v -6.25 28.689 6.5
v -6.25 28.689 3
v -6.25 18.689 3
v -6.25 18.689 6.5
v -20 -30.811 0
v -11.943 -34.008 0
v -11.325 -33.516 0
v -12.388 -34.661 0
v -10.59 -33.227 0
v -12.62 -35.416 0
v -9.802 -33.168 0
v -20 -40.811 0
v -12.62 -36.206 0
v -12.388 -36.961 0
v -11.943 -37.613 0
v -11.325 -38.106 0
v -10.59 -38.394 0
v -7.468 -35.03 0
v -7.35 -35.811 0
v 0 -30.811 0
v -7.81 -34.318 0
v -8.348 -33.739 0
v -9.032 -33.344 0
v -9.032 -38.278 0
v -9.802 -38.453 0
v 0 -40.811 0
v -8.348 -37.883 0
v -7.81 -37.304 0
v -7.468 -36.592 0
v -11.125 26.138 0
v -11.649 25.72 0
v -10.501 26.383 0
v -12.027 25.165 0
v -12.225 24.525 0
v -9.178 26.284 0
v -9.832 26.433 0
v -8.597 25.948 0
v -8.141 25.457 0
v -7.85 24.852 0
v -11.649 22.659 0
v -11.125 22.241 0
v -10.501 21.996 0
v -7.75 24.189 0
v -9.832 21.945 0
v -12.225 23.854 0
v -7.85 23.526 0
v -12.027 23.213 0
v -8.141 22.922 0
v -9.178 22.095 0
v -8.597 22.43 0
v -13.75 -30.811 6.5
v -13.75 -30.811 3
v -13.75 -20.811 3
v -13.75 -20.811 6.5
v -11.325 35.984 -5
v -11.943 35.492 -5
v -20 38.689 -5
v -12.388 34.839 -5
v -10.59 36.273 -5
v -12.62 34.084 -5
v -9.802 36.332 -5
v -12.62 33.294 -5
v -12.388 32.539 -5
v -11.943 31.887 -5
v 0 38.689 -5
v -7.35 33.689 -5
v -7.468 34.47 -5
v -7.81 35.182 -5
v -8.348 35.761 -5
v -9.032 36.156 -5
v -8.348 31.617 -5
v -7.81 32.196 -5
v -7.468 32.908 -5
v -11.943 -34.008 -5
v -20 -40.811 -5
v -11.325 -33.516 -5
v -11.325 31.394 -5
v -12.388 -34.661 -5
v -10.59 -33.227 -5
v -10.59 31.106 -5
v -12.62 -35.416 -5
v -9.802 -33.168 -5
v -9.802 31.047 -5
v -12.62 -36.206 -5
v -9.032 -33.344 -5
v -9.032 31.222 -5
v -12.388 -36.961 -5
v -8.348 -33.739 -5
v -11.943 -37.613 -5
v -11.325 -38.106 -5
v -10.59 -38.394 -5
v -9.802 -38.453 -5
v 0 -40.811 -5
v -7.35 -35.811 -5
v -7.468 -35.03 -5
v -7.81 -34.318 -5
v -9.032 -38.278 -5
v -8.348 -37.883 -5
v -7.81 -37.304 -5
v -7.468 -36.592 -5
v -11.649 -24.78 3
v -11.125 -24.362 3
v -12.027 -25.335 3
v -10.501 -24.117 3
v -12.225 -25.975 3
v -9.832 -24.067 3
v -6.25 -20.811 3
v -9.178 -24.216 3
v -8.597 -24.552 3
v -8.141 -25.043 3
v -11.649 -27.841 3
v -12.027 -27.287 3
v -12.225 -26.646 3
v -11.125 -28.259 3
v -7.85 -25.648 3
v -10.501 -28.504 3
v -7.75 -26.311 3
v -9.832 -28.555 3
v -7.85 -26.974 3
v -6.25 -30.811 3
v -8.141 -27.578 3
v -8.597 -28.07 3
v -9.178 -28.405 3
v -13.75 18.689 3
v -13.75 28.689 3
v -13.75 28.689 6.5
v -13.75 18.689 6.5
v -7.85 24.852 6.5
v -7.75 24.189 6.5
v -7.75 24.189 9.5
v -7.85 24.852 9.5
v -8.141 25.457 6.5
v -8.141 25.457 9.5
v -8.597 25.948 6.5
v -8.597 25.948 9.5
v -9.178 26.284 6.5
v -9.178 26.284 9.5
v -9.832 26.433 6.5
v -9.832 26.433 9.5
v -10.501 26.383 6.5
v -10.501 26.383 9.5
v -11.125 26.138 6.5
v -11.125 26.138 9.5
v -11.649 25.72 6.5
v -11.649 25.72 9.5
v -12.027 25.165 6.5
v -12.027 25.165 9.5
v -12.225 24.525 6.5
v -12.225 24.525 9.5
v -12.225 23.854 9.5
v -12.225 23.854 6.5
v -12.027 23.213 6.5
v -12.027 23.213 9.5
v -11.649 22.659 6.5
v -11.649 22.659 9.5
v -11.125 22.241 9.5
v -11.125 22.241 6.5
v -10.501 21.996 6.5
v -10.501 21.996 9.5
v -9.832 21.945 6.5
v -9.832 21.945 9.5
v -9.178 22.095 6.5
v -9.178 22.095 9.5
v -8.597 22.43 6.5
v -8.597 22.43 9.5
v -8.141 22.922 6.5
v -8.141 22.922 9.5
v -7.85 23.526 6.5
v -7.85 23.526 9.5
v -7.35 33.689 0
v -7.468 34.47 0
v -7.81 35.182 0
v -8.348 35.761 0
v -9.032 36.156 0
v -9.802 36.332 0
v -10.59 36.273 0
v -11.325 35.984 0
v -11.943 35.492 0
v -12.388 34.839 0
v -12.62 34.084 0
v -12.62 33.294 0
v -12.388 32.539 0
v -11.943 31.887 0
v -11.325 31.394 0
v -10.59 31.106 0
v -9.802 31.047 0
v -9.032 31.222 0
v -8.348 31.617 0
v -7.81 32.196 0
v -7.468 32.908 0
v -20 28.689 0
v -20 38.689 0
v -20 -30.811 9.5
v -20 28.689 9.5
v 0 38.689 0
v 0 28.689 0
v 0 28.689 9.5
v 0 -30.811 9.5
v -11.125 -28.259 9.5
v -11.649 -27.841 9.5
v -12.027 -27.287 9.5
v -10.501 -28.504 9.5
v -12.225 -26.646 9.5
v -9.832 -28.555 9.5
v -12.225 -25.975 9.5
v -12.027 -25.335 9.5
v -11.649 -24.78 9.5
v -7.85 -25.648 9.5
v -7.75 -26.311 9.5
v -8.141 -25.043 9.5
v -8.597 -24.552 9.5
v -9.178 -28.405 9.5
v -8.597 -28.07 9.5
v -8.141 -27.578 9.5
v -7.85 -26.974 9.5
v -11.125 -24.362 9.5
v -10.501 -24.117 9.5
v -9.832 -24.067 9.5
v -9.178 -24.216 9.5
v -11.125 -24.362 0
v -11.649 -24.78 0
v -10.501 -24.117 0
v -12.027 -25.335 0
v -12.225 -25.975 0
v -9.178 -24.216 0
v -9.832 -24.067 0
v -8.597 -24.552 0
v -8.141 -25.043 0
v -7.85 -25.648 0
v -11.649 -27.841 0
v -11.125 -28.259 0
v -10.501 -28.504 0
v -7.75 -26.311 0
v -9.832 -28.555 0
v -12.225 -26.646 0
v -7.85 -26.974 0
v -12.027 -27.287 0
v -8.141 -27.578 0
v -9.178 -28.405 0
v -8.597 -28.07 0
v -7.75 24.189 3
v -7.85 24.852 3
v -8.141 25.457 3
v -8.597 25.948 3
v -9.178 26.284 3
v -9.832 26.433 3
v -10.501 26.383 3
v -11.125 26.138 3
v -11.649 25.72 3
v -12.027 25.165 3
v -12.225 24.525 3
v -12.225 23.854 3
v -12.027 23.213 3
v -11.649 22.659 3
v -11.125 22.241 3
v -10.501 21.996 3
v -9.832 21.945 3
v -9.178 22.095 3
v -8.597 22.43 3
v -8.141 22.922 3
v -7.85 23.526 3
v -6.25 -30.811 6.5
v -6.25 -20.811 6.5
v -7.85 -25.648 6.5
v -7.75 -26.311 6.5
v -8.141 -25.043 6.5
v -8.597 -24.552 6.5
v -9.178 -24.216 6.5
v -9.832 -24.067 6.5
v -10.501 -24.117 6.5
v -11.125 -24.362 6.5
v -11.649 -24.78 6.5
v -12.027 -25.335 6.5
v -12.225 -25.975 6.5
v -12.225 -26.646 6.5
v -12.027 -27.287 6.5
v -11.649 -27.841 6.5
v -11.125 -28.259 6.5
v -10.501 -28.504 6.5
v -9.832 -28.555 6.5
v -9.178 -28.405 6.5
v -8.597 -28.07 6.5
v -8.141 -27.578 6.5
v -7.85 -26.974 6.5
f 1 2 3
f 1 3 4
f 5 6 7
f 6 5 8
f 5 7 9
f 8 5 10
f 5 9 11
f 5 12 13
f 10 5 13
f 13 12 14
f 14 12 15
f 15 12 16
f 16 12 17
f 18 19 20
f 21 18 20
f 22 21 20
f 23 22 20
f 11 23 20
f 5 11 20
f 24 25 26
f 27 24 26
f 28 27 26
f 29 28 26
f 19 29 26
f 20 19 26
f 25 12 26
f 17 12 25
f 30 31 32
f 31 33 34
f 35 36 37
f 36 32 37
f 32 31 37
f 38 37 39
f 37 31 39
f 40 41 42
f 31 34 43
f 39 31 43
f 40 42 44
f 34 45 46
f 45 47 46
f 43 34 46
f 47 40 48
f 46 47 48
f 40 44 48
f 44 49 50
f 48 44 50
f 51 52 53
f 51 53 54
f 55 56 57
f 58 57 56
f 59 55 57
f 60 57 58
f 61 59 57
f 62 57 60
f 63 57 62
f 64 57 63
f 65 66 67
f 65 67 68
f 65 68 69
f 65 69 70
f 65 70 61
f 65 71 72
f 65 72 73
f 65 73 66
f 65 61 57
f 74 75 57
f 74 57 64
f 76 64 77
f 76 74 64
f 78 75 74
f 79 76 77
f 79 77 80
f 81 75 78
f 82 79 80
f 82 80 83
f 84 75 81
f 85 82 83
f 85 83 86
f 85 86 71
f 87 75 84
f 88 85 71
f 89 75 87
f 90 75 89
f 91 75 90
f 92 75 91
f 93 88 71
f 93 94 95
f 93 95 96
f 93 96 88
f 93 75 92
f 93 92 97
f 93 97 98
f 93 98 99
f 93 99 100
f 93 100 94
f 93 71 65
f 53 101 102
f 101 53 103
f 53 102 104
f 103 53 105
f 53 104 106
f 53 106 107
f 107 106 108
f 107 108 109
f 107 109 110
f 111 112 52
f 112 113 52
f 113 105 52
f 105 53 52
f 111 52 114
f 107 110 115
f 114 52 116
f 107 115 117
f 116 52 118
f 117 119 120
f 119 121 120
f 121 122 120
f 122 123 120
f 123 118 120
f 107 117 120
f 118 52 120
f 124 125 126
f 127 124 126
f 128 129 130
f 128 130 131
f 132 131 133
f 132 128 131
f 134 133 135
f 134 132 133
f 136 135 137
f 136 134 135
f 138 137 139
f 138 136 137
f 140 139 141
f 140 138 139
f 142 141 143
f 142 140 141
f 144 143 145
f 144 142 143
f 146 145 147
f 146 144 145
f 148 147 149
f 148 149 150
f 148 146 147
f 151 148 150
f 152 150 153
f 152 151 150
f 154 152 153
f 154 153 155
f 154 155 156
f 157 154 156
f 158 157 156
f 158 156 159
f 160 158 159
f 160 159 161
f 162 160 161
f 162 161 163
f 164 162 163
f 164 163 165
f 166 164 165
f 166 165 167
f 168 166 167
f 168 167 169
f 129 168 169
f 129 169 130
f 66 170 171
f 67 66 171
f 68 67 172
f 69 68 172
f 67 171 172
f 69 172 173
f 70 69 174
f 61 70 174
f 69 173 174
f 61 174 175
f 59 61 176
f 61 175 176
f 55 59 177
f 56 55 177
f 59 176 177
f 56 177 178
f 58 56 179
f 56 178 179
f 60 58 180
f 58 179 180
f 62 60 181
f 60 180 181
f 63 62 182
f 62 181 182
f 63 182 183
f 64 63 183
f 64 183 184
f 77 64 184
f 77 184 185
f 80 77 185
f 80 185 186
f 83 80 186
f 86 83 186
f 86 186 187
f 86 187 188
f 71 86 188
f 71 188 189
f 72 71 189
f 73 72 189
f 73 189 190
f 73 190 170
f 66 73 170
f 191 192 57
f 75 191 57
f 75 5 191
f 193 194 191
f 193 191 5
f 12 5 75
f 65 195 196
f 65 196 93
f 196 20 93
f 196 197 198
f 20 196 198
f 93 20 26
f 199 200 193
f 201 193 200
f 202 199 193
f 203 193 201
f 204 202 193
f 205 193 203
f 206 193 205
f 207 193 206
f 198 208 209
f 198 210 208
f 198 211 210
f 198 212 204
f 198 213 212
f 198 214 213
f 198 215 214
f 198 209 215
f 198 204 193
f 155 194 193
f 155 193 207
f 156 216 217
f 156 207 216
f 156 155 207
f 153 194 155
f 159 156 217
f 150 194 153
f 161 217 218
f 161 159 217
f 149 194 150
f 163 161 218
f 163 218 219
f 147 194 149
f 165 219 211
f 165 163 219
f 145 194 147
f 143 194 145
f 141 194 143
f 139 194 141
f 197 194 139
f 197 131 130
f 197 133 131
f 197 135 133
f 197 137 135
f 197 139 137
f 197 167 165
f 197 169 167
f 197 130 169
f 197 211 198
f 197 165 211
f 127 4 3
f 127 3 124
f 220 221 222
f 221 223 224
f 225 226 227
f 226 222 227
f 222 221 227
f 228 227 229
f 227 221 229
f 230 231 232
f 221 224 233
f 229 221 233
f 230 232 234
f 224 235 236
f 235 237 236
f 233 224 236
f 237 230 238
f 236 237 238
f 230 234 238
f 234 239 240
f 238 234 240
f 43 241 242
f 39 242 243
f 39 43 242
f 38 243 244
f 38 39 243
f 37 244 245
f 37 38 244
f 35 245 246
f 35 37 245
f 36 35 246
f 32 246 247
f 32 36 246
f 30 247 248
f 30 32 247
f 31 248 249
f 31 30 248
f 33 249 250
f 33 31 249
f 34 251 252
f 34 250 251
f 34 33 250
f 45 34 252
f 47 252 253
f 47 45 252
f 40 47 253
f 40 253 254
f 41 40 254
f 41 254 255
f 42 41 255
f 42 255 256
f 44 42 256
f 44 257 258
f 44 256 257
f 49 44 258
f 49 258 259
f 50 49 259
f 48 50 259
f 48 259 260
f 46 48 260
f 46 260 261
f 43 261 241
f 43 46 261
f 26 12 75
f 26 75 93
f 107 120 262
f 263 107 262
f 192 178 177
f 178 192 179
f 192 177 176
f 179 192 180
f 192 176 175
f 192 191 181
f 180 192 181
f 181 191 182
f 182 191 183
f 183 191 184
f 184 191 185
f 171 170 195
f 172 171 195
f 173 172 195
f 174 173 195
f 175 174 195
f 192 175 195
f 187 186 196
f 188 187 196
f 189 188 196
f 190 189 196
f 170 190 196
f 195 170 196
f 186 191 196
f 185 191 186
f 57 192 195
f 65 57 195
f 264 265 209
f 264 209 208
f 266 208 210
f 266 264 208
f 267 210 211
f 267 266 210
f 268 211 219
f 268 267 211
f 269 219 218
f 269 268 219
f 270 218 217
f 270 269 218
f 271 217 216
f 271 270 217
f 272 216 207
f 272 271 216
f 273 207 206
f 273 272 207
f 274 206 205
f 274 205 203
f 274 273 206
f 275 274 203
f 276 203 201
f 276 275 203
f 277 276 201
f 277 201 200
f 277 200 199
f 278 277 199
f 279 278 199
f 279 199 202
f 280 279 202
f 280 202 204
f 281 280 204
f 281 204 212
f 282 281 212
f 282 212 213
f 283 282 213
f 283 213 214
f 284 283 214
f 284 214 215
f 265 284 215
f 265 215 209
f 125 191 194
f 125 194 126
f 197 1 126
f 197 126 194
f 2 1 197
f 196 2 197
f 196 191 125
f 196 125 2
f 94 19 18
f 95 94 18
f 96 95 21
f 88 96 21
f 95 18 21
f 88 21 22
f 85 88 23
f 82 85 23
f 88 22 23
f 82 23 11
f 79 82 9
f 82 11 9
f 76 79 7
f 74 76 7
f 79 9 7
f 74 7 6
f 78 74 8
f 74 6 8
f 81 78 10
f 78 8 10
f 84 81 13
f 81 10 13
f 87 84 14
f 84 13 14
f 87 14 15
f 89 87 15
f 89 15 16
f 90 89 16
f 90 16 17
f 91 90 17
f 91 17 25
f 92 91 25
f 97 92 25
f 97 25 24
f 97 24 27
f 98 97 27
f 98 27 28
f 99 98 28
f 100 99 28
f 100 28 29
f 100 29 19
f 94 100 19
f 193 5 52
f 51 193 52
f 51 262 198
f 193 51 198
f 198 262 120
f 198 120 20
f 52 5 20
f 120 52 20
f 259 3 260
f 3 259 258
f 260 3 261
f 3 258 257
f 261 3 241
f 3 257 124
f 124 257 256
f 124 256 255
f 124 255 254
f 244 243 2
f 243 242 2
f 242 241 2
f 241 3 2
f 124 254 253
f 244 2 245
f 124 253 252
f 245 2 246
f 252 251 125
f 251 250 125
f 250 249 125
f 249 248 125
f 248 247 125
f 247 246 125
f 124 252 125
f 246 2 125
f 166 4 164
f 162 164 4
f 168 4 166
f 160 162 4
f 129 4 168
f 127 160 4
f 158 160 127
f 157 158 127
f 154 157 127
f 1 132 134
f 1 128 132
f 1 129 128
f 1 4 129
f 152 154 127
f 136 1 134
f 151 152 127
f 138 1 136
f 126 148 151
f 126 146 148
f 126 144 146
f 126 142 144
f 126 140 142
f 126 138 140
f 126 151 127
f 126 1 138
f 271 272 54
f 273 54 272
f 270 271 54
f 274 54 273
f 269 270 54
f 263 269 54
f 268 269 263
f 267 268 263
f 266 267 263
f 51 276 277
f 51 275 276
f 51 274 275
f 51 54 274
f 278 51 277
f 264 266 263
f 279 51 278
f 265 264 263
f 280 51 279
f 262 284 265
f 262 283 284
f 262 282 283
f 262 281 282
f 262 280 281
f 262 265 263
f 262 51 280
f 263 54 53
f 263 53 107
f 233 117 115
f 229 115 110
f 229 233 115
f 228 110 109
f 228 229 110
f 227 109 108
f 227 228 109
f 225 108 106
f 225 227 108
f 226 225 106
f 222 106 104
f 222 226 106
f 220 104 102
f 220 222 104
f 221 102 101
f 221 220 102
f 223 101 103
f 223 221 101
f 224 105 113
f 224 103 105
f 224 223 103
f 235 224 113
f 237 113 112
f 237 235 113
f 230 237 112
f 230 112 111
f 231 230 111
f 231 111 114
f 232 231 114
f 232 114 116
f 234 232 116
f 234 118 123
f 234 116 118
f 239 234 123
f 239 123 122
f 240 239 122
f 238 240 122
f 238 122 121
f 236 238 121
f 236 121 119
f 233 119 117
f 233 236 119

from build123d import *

# Parameters (mm, degrees)
F0_W     = 20
F0_H     = 59.5
F0_R     = 2.25
F1_DEPTH = 9.5
F2_W     = 7.5
F2_H     = 3.5
F3_DEPTH = 10
F4_W     = 7.5
F4_H     = 3.5
F5_DEPTH = 10
F6_W     = 20
F6_H     = 79.5
F7_DEPTH = 5
F8_R     = 2.65
F9_DEPTH = 25


with BuildPart() as f1:
    # F0 (on Top) → F1 (new body)
    with BuildSketch(Plane.XY):
        with Locations((-10, -1.060811)):
            Rectangle(F0_W, F0_H)
        with Locations((-10, -26.310811)):
            Circle(F0_R, mode=Mode.SUBTRACT)
        with Locations((-10, 24.189189)):
            Circle(F0_R, mode=Mode.SUBTRACT)
    extrude(amount=F1_DEPTH)

    # F2 (on face) → F3 (cut)
    with BuildSketch(Plane(origin=(0, 28.689189, 0), x_dir=(-1, 0, 0), z_dir=(0, 1, 0))):
        with Locations((10, 4.75)):
            Rectangle(F2_W, F2_H)
    extrude(amount=-F3_DEPTH, mode=Mode.SUBTRACT)

    # F4 (on face) → F5 (cut)
    with BuildSketch(Plane.XZ.offset(30.810811)):
        with Locations((-10, 4.75)):
            Rectangle(F4_W, F4_H)
    extrude(amount=-F5_DEPTH, mode=Mode.SUBTRACT)

    # F6 (on face) → F7 (join)
    with BuildSketch(Plane(origin=(0, 0, 0), x_dir=(1, 0, 0), z_dir=(0, 0, -1))):
        with Locations((-10, 1.060811)):
            Rectangle(F6_W, F6_H)
    extrude(amount=F7_DEPTH)

    # F8 (on face) → F9 (cut)
    with BuildSketch(Plane.XY):
        with Locations((-10, 33.689189)):
            Circle(F8_R)
        with Locations((-10, -35.810811)):
            Circle(F8_R)
    extrude(amount=-F9_DEPTH, mode=Mode.SUBTRACT)


solid = f1.part
